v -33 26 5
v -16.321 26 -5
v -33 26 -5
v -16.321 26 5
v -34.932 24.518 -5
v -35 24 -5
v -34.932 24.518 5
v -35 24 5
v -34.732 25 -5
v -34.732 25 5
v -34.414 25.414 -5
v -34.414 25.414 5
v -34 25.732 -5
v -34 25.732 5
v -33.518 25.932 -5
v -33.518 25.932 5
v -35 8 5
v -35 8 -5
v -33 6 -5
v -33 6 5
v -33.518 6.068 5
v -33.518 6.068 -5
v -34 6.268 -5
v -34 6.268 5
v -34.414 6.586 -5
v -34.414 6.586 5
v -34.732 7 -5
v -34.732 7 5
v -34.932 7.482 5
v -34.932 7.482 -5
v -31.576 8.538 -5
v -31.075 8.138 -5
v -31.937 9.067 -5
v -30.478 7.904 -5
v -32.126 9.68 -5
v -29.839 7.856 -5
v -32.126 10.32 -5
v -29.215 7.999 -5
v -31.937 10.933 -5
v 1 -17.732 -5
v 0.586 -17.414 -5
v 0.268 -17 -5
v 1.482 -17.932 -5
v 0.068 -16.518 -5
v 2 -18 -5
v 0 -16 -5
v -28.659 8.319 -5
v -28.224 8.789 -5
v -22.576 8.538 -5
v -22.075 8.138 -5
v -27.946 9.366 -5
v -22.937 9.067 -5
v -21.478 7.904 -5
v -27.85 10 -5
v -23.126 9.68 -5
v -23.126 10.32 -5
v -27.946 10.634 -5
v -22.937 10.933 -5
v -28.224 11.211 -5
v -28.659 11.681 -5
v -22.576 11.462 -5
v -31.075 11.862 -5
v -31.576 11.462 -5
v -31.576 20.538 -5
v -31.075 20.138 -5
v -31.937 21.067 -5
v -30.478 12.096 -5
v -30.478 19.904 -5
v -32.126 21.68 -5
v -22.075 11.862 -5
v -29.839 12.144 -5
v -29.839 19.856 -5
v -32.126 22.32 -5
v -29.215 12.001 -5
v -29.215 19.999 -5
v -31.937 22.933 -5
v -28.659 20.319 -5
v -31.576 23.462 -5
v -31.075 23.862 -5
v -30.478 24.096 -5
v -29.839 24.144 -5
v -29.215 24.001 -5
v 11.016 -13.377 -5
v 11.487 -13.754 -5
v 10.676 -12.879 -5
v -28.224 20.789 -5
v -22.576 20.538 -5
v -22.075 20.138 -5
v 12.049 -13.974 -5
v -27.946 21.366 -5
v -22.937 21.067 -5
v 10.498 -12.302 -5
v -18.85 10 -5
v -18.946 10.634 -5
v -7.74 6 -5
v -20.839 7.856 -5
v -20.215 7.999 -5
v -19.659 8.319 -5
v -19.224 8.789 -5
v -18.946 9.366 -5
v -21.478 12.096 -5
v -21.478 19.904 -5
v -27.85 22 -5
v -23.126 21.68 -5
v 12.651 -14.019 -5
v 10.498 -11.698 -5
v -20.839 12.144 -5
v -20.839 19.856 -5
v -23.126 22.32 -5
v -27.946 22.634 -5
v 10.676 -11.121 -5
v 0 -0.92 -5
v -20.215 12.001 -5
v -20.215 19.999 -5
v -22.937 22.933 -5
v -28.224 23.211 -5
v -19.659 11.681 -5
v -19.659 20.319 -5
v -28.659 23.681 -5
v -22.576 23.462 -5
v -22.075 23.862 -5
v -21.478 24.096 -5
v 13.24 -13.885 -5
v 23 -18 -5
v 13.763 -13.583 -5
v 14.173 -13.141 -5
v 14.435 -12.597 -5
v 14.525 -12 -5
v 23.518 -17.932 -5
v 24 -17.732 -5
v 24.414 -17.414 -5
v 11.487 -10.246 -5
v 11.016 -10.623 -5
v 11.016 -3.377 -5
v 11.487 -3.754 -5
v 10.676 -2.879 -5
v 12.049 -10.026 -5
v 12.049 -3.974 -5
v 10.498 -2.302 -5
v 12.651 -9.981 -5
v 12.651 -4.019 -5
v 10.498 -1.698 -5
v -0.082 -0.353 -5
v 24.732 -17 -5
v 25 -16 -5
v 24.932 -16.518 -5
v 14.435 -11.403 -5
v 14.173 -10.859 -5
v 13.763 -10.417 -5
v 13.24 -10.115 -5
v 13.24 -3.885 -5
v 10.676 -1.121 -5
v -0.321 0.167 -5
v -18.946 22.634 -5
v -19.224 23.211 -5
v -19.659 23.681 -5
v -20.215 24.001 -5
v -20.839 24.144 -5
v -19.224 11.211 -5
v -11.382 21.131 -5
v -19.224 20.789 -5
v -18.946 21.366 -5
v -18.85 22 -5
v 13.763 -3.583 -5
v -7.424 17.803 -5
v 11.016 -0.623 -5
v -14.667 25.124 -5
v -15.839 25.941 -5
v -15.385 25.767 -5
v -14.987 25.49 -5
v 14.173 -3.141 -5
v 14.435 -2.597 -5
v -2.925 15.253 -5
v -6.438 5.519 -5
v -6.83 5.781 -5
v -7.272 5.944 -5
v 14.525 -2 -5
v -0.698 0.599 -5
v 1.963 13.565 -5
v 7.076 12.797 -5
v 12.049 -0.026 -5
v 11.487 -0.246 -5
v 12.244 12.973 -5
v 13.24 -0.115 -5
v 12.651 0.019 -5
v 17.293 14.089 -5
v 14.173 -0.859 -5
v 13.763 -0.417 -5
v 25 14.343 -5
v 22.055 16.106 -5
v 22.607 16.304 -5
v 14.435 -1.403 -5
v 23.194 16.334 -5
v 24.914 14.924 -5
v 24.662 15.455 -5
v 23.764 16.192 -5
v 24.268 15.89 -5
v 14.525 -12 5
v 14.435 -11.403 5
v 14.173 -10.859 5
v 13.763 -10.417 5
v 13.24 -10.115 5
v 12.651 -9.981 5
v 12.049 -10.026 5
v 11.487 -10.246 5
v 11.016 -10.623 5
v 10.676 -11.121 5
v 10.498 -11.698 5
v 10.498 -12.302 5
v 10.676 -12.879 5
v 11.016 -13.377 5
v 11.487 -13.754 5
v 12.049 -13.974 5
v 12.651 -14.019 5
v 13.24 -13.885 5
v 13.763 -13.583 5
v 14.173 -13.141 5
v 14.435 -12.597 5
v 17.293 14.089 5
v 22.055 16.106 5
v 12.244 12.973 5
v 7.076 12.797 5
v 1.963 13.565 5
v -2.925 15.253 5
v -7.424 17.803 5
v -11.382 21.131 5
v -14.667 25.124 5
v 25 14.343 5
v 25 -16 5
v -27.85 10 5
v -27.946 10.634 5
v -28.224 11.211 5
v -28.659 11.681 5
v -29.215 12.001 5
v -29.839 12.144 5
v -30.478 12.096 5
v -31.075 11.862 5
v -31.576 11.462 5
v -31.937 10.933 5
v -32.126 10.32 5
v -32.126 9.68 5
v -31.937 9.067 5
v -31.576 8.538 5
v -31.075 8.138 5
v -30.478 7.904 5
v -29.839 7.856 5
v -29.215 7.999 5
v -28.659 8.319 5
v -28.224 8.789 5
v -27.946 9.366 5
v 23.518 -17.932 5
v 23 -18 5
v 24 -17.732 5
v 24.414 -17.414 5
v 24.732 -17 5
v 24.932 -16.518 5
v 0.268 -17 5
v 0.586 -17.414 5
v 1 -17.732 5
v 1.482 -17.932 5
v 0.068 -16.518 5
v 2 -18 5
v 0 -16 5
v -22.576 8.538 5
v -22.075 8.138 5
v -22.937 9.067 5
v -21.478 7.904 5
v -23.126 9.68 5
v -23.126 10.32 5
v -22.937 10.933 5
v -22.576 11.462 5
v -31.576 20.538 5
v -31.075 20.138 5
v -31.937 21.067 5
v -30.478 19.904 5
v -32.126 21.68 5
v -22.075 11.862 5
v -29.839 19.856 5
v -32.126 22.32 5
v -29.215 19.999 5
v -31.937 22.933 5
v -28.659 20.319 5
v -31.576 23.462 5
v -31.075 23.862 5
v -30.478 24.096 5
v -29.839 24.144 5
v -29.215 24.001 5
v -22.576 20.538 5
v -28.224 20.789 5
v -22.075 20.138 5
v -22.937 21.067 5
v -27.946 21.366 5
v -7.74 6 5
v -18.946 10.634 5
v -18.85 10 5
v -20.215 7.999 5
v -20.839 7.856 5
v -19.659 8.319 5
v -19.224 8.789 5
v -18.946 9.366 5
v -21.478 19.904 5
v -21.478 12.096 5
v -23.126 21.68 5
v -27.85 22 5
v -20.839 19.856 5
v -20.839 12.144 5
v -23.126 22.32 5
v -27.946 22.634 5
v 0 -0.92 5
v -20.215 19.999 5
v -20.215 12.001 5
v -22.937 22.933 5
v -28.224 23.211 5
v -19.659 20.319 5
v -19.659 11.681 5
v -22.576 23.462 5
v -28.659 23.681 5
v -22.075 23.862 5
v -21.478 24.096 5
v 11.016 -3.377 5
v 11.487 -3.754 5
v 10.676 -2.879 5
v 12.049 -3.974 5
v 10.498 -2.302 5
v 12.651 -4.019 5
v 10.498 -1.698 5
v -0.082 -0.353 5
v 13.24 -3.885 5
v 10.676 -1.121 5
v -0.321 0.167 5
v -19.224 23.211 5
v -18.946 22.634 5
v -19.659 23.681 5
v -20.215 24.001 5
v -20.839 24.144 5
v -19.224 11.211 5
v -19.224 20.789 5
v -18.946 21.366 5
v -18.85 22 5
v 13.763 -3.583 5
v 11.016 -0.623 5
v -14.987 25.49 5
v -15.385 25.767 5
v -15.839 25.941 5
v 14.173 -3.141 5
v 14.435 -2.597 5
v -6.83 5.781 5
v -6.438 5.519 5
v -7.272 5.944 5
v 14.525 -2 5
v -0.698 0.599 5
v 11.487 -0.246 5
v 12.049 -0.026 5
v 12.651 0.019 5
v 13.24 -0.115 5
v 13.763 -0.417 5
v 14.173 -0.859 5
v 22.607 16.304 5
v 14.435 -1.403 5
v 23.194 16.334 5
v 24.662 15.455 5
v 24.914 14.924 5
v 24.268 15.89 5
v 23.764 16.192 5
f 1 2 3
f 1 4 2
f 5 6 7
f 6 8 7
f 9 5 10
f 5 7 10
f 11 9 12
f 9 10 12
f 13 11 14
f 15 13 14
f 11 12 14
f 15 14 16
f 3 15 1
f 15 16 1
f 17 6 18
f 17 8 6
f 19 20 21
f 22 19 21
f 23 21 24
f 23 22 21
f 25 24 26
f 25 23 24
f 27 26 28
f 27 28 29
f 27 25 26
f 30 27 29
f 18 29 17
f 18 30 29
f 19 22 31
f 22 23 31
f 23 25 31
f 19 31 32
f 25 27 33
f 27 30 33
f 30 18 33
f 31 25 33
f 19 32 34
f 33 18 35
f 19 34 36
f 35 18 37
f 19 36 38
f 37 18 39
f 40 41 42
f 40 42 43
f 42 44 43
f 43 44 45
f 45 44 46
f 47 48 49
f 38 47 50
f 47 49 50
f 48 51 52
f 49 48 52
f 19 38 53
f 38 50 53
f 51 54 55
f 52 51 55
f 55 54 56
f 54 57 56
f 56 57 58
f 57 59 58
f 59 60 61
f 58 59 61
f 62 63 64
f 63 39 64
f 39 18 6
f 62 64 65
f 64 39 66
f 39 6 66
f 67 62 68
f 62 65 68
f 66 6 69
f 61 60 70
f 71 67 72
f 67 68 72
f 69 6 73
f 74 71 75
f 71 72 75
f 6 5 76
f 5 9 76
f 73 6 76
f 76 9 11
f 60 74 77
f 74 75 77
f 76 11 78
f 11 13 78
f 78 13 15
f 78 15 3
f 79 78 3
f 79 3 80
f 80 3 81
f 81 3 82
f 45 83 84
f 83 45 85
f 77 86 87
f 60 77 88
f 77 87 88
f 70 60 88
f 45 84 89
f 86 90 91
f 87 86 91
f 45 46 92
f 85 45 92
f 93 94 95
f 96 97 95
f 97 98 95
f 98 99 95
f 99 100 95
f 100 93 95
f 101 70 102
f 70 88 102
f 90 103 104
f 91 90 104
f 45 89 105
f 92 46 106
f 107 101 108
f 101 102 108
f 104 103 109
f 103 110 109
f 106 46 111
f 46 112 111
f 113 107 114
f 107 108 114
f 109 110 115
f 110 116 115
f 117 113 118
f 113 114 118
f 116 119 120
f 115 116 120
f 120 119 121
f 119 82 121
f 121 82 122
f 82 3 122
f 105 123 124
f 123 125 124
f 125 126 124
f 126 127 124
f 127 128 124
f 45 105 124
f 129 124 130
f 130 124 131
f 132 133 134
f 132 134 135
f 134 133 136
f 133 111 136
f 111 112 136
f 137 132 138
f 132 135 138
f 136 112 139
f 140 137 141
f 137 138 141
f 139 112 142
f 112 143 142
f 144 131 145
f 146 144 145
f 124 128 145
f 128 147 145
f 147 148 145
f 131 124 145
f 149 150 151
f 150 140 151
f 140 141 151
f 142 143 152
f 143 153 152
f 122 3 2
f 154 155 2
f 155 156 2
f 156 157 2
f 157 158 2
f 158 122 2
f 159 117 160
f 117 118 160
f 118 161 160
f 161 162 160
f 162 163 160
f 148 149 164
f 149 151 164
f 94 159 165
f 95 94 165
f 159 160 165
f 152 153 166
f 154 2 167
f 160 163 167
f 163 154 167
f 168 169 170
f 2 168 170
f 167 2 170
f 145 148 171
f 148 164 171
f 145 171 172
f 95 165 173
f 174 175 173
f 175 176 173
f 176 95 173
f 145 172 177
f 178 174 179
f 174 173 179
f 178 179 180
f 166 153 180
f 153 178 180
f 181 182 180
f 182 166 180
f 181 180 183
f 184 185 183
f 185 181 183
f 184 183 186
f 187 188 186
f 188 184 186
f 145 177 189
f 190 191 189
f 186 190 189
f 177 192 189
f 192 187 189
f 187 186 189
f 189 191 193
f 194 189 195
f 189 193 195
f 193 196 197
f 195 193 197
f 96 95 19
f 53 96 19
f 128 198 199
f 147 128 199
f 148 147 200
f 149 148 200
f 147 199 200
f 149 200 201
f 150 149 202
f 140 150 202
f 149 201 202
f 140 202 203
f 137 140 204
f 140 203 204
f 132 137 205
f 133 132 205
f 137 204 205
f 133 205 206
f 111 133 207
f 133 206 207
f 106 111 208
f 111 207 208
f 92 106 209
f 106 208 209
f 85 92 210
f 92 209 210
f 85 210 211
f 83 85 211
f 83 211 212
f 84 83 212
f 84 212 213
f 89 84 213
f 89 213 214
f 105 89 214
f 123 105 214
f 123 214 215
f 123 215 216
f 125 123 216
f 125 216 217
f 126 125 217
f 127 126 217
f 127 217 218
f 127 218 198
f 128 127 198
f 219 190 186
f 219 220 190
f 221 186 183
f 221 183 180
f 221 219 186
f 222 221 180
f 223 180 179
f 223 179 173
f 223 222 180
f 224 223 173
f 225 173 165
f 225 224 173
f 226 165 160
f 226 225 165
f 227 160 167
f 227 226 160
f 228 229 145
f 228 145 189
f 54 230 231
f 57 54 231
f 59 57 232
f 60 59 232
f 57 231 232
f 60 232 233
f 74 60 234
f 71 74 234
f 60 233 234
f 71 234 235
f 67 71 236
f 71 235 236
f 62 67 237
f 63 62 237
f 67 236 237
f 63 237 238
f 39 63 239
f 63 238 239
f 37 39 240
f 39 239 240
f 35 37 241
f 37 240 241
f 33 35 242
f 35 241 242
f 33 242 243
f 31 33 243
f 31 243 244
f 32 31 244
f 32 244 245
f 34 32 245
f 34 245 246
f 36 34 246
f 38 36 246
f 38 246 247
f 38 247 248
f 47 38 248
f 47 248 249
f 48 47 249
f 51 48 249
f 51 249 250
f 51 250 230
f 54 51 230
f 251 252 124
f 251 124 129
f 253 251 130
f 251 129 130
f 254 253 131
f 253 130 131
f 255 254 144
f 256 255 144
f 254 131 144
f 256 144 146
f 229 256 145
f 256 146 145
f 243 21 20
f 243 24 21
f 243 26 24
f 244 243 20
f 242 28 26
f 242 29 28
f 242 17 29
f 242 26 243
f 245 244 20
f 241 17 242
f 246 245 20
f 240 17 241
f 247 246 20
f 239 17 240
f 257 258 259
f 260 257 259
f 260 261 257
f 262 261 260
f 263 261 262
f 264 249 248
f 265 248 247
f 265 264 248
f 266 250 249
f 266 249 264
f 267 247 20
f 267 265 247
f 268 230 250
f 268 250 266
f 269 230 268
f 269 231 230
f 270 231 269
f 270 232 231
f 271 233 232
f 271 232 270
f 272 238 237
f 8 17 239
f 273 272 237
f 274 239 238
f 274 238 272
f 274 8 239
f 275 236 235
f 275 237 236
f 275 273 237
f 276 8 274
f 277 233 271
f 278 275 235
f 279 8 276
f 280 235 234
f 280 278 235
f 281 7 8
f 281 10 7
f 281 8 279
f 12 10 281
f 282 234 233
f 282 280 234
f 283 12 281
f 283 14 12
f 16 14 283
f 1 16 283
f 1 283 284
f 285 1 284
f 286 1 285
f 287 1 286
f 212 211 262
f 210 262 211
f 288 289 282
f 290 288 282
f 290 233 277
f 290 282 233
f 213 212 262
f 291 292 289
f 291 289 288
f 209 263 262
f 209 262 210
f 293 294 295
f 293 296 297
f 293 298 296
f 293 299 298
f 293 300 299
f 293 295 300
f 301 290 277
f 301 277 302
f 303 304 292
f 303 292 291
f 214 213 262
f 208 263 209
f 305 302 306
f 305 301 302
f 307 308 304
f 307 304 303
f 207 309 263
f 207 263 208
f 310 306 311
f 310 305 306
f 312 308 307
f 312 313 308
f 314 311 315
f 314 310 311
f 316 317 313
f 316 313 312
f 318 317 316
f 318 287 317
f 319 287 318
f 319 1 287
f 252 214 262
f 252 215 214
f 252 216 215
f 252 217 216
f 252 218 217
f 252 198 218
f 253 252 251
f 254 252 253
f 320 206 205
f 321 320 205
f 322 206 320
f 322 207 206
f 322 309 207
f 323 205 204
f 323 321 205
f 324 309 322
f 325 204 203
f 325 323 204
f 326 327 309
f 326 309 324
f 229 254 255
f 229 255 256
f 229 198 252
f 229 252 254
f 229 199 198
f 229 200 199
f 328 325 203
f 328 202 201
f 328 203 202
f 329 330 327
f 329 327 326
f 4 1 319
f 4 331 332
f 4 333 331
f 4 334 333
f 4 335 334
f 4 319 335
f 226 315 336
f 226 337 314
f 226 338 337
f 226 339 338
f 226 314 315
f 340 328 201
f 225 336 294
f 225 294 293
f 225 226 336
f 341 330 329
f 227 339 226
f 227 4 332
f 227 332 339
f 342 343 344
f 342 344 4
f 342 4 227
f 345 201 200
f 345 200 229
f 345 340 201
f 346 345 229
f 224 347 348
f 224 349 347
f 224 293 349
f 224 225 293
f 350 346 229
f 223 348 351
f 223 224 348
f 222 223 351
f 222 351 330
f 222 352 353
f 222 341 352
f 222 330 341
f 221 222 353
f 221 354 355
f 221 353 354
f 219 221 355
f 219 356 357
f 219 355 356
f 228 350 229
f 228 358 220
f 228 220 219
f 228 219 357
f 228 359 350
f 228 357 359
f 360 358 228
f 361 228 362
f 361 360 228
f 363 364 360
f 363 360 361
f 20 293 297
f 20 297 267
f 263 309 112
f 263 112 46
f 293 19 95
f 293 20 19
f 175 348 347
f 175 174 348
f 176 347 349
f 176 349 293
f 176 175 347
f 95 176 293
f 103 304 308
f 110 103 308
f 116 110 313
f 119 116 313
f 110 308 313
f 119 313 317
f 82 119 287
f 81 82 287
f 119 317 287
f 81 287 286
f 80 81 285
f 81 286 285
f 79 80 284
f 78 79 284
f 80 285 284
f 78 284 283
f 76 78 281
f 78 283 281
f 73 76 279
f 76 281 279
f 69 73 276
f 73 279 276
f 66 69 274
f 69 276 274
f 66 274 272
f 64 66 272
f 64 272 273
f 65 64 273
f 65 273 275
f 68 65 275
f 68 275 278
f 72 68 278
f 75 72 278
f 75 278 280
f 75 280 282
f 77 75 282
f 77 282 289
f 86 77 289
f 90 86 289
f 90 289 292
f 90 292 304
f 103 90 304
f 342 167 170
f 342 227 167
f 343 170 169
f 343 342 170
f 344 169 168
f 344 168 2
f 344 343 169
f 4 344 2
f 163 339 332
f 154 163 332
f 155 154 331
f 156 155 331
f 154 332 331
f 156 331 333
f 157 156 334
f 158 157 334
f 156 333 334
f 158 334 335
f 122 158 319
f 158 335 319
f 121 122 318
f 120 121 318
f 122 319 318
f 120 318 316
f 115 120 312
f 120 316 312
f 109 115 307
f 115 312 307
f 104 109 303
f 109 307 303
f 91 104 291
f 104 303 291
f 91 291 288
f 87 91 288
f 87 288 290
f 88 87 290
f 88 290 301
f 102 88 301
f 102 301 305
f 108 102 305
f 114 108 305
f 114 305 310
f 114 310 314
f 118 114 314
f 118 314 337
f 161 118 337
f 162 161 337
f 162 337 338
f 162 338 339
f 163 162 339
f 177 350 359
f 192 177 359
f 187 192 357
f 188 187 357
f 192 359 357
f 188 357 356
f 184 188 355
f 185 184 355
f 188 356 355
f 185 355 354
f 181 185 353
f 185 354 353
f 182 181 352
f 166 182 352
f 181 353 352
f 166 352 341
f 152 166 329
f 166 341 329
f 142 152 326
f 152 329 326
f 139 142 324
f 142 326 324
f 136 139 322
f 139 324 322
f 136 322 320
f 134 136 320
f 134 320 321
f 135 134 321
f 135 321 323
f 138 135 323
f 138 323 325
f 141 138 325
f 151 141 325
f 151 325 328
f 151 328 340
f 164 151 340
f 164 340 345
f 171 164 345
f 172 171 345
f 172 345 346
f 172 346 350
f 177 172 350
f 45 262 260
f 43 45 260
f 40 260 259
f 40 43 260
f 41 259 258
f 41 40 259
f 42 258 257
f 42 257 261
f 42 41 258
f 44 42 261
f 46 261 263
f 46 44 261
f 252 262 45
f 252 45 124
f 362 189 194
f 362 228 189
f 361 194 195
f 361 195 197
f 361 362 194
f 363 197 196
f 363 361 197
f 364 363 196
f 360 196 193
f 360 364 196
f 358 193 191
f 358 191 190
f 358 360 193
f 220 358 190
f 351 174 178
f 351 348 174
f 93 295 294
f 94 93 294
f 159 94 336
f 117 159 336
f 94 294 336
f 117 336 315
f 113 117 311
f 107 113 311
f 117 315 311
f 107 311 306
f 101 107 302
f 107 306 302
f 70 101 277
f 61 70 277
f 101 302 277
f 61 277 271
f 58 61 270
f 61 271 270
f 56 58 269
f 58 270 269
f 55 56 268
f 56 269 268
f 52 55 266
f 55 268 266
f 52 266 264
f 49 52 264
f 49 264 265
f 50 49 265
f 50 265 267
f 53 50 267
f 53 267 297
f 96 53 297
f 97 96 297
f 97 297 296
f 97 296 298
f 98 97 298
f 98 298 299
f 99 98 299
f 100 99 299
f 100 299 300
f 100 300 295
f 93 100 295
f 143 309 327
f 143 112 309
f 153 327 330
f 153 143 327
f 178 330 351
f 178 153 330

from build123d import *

# Parameters (mm, degrees)
EXTRUDE_1_DEPTH          = 5
FILLET_1_R               = 2
FILLET_2_R               = 2
SKETCH_2_R               = 2.025
CUT_EXTRUDE_1_DEPTH      = 11
SKETCH_3_W               = 25
SKETCH_3_H               = 6
CUT_EXTRUDE_2_DEPTH      = 11
FILLET_3_R               = 2
SKETCH_4_R               = 2.15
CUT_EXTRUDE_3_DEPTH      = 1
CUT_EXTRUDE_3_DEPTH_BACK = 11
SKETCH_5_R               = 2.15
CUT_EXTRUDE_4_DEPTH      = 1
CUT_EXTRUDE_4_DEPTH_BACK = 11


with BuildPart() as part:
    # 草图1 → 凸台-拉伸1 (new body, symmetric)
    with BuildSketch(Plane.XY):
        with BuildLine():
            Line((0, 0), (0, -24))
            Line((0, -24), (25, -24))
            Line((25, -24), (25, 17.926801262))
            ThreePointArc((25, 17.926801262), (3.142873043, 13.301970467), (-15.238723859, 26))
            Line((-15.238723859, 26), (-35, 26))
            Line((-35, 26), (-35, 6))
            Line((-35, 6), (-7, 6))
            Line((-7, 6), (0, 0))
        make_face()
    extrude(amount=EXTRUDE_1_DEPTH, both=True)

    # 圆角1
    fillet_1_edges = [part.edges().sort_by_distance(p)[0] for p in [
        (-7, 6, 0),
        (-35, 6, 0),
        (-35, 26, 0),
        (25, -24, 0),
        (0, -24, 0),
        (0, 0, 0),
    ]]
    fillet(fillet_1_edges, radius=FILLET_1_R)

    # 圆角2
    fillet_2_edges = [part.edges().sort_by_distance(p)[0] for p in [
        (-15.238723859, 26, 0),
        (25, 17.926801262, 0),
    ]]
    fillet(fillet_2_edges, radius=FILLET_2_R)

    # 草图2 → 切除-拉伸1 (cut, through all)
    with BuildSketch(Plane.XY.offset(5)):
        with Locations((12.5, -2)):
            Circle(SKETCH_2_R)
        with Locations((12.5, -12)):
            Circle(SKETCH_2_R)
    extrude(amount=-CUT_EXTRUDE_1_DEPTH, mode=Mode.SUBTRACT)

    # 草图3 → 切除-拉伸2 (cut, through all)
    with BuildSketch(Plane.XY.offset(5)):
        with Locations((12.5, -21)):
            Rectangle(SKETCH_3_W, SKETCH_3_H)
    extrude(amount=-CUT_EXTRUDE_2_DEPTH, mode=Mode.SUBTRACT)

    # 圆角3
    fillet_3_edges = [part.edges().sort_by_distance(p)[0] for p in [
        (0, -18, 0),
        (25, -18, 0),
    ]]
    fillet(fillet_3_edges, radius=FILLET_3_R)

    # 草图4 → 切除-拉伸3 (cut, two sides)
    with BuildSketch(Plane.XY.offset(5)) as cut_extrude_3_sk:
        with Locations((-30, 22)):
            Circle(SKETCH_4_R)
        with Locations((-30, 10)):
            Circle(SKETCH_4_R)
    extrude(amount=CUT_EXTRUDE_3_DEPTH, mode=Mode.SUBTRACT)
    extrude(cut_extrude_3_sk.sketch, amount=-CUT_EXTRUDE_3_DEPTH_BACK, mode=Mode.SUBTRACT)

    # 草图5 → 切除-拉伸4 (cut, two sides)
    with BuildSketch(Plane.XY.offset(5)) as cut_extrude_4_sk:
        with Locations((-21, 10)):
            Circle(SKETCH_5_R)
        with Locations((-21, 22)):
            Circle(SKETCH_5_R)
    extrude(amount=CUT_EXTRUDE_4_DEPTH, mode=Mode.SUBTRACT)
    extrude(cut_extrude_4_sk.sketch, amount=-CUT_EXTRUDE_4_DEPTH_BACK, mode=Mode.SUBTRACT)


solid = part.part
